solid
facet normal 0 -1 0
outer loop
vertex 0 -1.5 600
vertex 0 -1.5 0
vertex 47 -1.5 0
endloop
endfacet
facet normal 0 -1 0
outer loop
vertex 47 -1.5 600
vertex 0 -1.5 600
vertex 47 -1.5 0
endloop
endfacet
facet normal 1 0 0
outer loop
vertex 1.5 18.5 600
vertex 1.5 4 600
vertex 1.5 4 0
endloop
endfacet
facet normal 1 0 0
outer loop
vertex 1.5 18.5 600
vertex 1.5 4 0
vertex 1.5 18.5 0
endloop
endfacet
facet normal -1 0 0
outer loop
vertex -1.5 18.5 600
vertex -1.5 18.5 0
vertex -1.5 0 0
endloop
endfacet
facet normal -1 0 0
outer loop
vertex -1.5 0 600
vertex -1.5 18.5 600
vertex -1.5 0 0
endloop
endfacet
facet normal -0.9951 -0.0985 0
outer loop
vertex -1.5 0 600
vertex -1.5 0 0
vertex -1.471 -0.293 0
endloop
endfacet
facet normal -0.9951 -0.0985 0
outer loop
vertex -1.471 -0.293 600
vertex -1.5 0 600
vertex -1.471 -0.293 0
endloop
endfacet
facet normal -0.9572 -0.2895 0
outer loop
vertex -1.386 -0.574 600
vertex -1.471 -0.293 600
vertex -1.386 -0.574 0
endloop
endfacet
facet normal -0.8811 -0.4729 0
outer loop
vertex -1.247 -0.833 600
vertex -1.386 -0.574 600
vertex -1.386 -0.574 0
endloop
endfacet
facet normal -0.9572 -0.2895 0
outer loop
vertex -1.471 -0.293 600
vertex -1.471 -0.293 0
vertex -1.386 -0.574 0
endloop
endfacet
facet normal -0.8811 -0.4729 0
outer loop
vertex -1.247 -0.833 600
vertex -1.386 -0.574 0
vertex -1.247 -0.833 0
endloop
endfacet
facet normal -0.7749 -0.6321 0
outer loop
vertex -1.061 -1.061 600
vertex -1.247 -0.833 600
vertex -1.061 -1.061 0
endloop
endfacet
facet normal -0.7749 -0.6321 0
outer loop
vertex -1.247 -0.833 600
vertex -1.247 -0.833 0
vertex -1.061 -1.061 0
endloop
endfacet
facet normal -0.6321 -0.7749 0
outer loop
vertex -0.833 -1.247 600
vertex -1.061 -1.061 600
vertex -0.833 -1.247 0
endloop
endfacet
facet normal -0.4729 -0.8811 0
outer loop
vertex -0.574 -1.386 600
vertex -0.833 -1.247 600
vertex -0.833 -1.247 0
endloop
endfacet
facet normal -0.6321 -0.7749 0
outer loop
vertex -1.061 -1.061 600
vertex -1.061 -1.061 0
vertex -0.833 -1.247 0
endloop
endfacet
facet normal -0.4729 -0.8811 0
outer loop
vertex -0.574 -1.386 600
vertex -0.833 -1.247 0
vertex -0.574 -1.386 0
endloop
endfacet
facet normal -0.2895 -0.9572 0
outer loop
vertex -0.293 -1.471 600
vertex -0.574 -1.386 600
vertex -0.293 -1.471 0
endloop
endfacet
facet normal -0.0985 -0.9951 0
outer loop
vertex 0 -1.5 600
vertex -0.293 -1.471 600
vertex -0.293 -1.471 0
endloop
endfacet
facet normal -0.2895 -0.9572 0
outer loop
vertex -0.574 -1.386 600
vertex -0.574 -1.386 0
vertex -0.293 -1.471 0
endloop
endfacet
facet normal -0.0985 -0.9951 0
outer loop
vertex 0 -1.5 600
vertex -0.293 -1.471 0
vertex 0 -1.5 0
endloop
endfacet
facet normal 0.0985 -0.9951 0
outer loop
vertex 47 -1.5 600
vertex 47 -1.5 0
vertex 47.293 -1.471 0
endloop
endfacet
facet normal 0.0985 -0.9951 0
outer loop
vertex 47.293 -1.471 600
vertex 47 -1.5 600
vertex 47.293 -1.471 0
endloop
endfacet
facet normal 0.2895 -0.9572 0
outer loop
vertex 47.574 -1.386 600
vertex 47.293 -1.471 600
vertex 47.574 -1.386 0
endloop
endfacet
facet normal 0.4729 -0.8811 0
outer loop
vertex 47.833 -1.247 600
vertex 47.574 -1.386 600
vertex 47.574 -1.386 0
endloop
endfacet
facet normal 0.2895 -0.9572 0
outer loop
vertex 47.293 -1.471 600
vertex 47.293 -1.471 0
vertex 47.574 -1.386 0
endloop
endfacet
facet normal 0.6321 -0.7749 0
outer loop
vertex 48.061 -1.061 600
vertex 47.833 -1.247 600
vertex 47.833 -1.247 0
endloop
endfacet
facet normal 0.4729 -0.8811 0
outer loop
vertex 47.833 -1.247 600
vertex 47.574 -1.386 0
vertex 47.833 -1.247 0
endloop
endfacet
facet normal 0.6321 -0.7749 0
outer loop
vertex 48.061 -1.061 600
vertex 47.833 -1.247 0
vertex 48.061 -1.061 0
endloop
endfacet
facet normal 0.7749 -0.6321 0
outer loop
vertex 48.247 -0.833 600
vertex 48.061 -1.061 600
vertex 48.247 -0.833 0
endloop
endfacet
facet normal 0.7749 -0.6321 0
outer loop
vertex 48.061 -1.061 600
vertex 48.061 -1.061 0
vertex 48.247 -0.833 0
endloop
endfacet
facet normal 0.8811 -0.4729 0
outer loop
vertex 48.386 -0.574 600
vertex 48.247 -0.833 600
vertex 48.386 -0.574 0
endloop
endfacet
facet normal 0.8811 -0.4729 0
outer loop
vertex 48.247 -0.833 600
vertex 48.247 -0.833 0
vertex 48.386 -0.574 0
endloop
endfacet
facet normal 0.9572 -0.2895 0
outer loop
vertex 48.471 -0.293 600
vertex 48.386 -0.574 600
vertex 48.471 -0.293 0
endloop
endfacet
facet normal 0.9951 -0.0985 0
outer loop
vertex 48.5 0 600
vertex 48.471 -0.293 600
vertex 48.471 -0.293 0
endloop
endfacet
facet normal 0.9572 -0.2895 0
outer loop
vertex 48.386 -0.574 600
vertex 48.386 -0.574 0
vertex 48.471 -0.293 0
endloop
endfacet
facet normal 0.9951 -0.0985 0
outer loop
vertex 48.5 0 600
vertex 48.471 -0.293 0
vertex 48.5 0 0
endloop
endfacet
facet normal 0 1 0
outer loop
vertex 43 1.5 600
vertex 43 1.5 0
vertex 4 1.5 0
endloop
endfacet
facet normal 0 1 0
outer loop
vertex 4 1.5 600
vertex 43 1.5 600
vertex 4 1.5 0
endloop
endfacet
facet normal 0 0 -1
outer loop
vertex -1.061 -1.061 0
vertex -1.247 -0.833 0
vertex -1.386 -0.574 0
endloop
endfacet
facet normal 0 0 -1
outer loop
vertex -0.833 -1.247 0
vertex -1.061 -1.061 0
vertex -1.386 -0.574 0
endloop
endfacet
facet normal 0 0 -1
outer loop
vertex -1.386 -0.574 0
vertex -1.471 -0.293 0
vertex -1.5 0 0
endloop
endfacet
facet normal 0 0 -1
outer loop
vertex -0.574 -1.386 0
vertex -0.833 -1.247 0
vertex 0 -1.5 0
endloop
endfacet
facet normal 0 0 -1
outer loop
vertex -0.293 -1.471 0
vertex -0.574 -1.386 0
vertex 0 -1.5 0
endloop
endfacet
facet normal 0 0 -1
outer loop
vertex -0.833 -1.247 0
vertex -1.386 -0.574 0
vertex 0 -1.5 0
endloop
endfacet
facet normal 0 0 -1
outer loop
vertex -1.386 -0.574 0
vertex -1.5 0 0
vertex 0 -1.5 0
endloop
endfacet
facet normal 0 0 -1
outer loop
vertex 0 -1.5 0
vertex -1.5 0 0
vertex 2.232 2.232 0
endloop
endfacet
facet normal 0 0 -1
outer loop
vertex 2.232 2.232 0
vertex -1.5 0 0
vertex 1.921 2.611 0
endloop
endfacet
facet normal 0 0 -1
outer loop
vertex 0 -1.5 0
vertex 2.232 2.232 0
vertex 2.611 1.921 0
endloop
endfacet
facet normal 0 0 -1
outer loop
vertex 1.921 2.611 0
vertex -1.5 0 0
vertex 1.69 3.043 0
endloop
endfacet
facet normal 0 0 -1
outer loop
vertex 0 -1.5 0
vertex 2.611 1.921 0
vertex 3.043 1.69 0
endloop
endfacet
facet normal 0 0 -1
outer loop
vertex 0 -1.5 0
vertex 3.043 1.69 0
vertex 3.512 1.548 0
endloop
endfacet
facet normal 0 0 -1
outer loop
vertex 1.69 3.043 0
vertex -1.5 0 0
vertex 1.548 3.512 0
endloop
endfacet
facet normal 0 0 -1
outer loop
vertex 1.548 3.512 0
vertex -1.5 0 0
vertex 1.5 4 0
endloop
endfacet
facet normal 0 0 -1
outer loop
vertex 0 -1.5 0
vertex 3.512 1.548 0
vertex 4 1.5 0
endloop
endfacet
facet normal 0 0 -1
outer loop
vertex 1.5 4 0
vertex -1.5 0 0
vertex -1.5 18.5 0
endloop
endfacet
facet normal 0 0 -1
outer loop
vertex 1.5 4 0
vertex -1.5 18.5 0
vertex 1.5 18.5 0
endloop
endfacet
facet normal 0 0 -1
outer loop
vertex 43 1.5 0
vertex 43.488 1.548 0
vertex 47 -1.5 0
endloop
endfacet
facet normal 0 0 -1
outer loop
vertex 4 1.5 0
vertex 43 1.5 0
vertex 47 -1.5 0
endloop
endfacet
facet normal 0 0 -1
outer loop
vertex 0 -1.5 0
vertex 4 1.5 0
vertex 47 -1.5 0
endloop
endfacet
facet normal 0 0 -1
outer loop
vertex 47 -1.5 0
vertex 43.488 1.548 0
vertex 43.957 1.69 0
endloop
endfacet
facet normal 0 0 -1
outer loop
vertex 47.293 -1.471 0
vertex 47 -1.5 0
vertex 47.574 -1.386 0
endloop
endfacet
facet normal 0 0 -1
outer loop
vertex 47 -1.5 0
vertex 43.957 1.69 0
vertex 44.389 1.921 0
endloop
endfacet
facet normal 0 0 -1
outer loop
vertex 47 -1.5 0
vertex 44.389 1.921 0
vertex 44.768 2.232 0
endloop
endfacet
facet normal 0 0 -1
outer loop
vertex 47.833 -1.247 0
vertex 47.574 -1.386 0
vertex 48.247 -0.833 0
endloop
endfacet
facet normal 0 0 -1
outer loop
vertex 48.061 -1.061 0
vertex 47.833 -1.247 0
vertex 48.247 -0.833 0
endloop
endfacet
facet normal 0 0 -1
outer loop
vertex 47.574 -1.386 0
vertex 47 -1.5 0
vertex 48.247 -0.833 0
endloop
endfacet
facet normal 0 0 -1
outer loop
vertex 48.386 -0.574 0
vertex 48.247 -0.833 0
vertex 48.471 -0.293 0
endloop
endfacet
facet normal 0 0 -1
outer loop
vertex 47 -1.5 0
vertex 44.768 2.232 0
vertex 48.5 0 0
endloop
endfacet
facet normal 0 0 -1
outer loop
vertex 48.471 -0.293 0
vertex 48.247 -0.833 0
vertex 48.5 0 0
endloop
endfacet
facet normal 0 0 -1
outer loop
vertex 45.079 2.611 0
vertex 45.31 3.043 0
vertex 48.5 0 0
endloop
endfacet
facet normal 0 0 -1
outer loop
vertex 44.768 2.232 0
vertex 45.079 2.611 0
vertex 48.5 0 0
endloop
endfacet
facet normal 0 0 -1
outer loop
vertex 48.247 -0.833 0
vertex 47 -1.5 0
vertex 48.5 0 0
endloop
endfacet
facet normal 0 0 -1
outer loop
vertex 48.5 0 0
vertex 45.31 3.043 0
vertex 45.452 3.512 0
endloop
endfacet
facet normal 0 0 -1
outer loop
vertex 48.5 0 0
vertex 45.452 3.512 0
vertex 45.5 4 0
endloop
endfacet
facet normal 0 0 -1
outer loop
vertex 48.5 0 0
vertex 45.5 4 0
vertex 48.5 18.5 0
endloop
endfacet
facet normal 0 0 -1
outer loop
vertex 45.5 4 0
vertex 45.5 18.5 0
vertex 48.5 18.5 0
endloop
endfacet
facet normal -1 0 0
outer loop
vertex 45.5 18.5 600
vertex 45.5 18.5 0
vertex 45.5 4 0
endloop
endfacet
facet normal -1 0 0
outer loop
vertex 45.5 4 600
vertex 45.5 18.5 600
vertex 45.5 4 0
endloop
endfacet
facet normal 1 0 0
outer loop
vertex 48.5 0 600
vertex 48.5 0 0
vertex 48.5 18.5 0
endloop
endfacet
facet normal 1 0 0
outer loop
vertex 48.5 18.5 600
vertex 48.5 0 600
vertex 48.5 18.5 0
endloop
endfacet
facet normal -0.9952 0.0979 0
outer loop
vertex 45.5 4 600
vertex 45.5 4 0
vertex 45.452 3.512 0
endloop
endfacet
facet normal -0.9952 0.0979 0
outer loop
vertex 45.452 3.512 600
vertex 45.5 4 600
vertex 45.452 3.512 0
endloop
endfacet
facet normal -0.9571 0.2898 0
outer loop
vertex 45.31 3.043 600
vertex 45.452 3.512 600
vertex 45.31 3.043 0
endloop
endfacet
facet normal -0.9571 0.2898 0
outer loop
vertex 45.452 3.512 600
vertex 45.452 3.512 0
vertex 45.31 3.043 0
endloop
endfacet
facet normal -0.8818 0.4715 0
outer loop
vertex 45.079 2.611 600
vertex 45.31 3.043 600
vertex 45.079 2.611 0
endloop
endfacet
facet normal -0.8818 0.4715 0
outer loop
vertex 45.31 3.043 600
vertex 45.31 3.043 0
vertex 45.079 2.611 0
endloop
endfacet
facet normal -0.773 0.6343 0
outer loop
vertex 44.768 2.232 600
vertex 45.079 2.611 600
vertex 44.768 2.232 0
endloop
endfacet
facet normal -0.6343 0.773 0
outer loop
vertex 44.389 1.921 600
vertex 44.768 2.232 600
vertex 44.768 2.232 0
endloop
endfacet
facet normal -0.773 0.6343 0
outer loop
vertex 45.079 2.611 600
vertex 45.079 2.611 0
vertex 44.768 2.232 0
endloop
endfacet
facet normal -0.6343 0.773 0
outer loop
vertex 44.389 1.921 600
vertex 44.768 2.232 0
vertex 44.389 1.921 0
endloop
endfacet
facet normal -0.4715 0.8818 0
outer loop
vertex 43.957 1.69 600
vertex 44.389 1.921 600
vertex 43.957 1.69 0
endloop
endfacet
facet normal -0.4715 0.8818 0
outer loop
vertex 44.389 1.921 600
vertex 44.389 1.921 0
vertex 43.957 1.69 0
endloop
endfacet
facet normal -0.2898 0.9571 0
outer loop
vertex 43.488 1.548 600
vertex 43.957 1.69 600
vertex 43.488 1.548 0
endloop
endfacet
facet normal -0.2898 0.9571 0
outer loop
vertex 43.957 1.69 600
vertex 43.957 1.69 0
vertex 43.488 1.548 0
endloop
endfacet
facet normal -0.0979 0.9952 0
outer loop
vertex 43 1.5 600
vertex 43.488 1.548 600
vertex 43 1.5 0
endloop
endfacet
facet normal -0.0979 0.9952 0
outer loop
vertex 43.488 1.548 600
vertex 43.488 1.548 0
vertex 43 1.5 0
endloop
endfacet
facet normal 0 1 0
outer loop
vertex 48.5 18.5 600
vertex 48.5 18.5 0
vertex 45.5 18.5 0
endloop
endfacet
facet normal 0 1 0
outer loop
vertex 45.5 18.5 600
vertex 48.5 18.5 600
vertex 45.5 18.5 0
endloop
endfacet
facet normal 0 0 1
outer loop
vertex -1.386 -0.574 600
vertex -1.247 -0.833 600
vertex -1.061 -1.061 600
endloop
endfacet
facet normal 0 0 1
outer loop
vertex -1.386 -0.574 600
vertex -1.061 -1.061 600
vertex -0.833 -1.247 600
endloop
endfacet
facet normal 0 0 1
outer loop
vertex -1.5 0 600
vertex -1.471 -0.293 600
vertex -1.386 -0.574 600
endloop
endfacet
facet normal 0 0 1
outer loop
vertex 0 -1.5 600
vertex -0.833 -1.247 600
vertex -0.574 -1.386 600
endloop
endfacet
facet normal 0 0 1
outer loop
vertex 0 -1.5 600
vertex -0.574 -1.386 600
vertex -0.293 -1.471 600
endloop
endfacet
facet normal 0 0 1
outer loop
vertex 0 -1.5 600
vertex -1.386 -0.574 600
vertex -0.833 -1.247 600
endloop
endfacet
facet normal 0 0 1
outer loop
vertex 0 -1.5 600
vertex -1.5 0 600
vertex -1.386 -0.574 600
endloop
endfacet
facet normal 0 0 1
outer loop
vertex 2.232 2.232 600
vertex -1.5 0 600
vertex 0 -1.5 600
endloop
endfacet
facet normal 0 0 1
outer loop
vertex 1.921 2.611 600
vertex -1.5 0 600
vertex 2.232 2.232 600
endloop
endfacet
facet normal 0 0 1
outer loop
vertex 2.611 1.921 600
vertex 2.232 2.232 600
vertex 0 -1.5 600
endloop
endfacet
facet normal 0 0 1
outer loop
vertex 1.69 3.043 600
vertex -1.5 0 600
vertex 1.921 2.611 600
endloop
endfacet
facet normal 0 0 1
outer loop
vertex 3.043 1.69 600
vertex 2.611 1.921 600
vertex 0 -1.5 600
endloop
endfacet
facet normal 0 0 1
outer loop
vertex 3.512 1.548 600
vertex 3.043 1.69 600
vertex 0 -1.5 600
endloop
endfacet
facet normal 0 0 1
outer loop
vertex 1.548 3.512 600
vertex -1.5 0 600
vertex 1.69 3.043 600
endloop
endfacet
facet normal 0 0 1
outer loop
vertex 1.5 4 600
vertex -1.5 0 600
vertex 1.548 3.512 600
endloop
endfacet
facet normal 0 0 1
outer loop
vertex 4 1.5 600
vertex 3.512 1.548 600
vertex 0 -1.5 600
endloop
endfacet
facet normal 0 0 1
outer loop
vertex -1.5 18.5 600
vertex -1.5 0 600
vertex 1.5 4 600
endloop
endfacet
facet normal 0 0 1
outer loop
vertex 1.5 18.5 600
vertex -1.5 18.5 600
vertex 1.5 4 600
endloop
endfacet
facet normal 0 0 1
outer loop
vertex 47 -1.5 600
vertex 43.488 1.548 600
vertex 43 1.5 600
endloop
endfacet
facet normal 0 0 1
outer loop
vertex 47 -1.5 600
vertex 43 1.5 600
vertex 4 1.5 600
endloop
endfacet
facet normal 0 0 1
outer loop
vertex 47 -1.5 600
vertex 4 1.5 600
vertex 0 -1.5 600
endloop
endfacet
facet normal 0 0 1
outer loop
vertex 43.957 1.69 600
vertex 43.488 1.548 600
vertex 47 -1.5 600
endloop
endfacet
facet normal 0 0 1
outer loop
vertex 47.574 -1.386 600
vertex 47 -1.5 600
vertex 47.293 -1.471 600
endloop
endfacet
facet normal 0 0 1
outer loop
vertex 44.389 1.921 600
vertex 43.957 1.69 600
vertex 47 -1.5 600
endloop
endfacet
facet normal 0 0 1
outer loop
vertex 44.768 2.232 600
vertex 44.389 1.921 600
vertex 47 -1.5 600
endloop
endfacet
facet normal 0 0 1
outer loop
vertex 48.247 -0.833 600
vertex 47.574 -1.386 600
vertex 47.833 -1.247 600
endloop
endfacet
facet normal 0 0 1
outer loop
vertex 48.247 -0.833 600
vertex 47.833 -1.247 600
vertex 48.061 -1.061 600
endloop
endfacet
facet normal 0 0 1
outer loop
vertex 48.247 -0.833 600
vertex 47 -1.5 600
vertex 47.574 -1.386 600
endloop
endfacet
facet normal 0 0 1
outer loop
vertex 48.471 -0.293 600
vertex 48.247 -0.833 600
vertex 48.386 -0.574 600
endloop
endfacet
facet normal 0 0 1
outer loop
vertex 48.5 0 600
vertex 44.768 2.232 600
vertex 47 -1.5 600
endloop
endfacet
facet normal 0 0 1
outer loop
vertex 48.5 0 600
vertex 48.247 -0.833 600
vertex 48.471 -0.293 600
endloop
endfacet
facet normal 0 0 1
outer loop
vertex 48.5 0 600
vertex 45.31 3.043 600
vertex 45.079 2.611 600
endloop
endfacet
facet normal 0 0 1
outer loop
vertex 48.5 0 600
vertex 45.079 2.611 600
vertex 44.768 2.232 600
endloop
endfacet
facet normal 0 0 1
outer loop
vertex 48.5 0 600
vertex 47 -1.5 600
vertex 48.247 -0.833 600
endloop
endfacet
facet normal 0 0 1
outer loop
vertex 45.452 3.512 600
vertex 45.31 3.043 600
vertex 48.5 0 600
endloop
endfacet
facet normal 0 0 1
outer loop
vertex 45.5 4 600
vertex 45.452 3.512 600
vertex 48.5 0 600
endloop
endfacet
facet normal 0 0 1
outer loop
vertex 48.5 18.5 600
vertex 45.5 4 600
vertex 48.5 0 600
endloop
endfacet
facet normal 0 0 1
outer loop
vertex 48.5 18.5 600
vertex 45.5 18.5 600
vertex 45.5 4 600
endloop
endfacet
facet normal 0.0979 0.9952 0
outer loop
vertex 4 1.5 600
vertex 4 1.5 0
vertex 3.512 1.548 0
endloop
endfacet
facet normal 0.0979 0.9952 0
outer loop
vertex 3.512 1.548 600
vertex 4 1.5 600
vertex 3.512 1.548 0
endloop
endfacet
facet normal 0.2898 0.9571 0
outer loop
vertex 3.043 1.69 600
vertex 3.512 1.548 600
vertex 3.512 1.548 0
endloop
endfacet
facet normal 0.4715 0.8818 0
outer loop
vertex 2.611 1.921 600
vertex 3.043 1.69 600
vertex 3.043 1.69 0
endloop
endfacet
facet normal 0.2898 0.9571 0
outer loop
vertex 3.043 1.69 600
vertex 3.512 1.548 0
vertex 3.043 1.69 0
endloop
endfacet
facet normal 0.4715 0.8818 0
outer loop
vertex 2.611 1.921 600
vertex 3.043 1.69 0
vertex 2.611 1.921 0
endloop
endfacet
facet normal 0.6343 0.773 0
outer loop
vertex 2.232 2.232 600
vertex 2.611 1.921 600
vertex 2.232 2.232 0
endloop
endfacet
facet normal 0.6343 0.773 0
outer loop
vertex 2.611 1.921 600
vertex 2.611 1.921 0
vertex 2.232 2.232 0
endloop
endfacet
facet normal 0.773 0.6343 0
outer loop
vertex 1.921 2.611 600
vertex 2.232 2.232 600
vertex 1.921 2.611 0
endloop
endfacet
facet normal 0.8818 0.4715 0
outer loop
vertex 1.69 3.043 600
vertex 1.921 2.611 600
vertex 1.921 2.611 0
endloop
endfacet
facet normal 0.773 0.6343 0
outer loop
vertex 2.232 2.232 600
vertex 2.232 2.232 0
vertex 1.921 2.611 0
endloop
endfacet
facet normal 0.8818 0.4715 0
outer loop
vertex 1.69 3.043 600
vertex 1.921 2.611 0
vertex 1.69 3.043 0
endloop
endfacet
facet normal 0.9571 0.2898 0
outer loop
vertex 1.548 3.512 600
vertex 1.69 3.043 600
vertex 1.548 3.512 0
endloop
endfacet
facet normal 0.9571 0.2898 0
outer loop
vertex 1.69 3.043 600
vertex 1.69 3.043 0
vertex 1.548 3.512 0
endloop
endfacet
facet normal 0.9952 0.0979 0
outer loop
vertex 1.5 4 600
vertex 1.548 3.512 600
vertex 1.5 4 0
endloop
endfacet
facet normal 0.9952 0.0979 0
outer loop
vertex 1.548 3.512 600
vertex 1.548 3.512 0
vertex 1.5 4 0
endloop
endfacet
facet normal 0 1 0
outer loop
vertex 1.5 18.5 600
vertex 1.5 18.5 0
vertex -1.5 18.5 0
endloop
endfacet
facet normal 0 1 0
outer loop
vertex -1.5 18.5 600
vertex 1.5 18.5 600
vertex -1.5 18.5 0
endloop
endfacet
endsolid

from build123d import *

# Parameters (mm, degrees)
F1_DEPTH = 600


with BuildPart() as f1:
    # F0 (on Top) → F1 (new body)
    with BuildSketch(Plane.XY):
        with BuildLine():
            ThreePointArc((-1.5, 0), (-1.06066, -1.06066), (0, -1.5))
            Line((0, -1.5), (47, -1.5))
            ThreePointArc((47, -1.5), (48.06066, -1.06066), (48.5, 0))
            Line((48.5, 0), (48.5, 18.5))
            Line((48.5, 18.5), (45.5, 18.5))
            Line((45.5, 18.5), (45.5, 4))
            ThreePointArc((45.5, 4), (44.767767, 2.232233), (43, 1.5))
            Line((43, 1.5), (4, 1.5))
            ThreePointArc((4, 1.5), (2.232233, 2.232233), (1.5, 4))
            Line((1.5, 4), (1.5, 18.5))
            Line((1.5, 18.5), (-1.5, 18.5))
            Line((-1.5, 18.5), (-1.5, 0))
        make_face()
    extrude(amount=F1_DEPTH)


solid = f1.part
